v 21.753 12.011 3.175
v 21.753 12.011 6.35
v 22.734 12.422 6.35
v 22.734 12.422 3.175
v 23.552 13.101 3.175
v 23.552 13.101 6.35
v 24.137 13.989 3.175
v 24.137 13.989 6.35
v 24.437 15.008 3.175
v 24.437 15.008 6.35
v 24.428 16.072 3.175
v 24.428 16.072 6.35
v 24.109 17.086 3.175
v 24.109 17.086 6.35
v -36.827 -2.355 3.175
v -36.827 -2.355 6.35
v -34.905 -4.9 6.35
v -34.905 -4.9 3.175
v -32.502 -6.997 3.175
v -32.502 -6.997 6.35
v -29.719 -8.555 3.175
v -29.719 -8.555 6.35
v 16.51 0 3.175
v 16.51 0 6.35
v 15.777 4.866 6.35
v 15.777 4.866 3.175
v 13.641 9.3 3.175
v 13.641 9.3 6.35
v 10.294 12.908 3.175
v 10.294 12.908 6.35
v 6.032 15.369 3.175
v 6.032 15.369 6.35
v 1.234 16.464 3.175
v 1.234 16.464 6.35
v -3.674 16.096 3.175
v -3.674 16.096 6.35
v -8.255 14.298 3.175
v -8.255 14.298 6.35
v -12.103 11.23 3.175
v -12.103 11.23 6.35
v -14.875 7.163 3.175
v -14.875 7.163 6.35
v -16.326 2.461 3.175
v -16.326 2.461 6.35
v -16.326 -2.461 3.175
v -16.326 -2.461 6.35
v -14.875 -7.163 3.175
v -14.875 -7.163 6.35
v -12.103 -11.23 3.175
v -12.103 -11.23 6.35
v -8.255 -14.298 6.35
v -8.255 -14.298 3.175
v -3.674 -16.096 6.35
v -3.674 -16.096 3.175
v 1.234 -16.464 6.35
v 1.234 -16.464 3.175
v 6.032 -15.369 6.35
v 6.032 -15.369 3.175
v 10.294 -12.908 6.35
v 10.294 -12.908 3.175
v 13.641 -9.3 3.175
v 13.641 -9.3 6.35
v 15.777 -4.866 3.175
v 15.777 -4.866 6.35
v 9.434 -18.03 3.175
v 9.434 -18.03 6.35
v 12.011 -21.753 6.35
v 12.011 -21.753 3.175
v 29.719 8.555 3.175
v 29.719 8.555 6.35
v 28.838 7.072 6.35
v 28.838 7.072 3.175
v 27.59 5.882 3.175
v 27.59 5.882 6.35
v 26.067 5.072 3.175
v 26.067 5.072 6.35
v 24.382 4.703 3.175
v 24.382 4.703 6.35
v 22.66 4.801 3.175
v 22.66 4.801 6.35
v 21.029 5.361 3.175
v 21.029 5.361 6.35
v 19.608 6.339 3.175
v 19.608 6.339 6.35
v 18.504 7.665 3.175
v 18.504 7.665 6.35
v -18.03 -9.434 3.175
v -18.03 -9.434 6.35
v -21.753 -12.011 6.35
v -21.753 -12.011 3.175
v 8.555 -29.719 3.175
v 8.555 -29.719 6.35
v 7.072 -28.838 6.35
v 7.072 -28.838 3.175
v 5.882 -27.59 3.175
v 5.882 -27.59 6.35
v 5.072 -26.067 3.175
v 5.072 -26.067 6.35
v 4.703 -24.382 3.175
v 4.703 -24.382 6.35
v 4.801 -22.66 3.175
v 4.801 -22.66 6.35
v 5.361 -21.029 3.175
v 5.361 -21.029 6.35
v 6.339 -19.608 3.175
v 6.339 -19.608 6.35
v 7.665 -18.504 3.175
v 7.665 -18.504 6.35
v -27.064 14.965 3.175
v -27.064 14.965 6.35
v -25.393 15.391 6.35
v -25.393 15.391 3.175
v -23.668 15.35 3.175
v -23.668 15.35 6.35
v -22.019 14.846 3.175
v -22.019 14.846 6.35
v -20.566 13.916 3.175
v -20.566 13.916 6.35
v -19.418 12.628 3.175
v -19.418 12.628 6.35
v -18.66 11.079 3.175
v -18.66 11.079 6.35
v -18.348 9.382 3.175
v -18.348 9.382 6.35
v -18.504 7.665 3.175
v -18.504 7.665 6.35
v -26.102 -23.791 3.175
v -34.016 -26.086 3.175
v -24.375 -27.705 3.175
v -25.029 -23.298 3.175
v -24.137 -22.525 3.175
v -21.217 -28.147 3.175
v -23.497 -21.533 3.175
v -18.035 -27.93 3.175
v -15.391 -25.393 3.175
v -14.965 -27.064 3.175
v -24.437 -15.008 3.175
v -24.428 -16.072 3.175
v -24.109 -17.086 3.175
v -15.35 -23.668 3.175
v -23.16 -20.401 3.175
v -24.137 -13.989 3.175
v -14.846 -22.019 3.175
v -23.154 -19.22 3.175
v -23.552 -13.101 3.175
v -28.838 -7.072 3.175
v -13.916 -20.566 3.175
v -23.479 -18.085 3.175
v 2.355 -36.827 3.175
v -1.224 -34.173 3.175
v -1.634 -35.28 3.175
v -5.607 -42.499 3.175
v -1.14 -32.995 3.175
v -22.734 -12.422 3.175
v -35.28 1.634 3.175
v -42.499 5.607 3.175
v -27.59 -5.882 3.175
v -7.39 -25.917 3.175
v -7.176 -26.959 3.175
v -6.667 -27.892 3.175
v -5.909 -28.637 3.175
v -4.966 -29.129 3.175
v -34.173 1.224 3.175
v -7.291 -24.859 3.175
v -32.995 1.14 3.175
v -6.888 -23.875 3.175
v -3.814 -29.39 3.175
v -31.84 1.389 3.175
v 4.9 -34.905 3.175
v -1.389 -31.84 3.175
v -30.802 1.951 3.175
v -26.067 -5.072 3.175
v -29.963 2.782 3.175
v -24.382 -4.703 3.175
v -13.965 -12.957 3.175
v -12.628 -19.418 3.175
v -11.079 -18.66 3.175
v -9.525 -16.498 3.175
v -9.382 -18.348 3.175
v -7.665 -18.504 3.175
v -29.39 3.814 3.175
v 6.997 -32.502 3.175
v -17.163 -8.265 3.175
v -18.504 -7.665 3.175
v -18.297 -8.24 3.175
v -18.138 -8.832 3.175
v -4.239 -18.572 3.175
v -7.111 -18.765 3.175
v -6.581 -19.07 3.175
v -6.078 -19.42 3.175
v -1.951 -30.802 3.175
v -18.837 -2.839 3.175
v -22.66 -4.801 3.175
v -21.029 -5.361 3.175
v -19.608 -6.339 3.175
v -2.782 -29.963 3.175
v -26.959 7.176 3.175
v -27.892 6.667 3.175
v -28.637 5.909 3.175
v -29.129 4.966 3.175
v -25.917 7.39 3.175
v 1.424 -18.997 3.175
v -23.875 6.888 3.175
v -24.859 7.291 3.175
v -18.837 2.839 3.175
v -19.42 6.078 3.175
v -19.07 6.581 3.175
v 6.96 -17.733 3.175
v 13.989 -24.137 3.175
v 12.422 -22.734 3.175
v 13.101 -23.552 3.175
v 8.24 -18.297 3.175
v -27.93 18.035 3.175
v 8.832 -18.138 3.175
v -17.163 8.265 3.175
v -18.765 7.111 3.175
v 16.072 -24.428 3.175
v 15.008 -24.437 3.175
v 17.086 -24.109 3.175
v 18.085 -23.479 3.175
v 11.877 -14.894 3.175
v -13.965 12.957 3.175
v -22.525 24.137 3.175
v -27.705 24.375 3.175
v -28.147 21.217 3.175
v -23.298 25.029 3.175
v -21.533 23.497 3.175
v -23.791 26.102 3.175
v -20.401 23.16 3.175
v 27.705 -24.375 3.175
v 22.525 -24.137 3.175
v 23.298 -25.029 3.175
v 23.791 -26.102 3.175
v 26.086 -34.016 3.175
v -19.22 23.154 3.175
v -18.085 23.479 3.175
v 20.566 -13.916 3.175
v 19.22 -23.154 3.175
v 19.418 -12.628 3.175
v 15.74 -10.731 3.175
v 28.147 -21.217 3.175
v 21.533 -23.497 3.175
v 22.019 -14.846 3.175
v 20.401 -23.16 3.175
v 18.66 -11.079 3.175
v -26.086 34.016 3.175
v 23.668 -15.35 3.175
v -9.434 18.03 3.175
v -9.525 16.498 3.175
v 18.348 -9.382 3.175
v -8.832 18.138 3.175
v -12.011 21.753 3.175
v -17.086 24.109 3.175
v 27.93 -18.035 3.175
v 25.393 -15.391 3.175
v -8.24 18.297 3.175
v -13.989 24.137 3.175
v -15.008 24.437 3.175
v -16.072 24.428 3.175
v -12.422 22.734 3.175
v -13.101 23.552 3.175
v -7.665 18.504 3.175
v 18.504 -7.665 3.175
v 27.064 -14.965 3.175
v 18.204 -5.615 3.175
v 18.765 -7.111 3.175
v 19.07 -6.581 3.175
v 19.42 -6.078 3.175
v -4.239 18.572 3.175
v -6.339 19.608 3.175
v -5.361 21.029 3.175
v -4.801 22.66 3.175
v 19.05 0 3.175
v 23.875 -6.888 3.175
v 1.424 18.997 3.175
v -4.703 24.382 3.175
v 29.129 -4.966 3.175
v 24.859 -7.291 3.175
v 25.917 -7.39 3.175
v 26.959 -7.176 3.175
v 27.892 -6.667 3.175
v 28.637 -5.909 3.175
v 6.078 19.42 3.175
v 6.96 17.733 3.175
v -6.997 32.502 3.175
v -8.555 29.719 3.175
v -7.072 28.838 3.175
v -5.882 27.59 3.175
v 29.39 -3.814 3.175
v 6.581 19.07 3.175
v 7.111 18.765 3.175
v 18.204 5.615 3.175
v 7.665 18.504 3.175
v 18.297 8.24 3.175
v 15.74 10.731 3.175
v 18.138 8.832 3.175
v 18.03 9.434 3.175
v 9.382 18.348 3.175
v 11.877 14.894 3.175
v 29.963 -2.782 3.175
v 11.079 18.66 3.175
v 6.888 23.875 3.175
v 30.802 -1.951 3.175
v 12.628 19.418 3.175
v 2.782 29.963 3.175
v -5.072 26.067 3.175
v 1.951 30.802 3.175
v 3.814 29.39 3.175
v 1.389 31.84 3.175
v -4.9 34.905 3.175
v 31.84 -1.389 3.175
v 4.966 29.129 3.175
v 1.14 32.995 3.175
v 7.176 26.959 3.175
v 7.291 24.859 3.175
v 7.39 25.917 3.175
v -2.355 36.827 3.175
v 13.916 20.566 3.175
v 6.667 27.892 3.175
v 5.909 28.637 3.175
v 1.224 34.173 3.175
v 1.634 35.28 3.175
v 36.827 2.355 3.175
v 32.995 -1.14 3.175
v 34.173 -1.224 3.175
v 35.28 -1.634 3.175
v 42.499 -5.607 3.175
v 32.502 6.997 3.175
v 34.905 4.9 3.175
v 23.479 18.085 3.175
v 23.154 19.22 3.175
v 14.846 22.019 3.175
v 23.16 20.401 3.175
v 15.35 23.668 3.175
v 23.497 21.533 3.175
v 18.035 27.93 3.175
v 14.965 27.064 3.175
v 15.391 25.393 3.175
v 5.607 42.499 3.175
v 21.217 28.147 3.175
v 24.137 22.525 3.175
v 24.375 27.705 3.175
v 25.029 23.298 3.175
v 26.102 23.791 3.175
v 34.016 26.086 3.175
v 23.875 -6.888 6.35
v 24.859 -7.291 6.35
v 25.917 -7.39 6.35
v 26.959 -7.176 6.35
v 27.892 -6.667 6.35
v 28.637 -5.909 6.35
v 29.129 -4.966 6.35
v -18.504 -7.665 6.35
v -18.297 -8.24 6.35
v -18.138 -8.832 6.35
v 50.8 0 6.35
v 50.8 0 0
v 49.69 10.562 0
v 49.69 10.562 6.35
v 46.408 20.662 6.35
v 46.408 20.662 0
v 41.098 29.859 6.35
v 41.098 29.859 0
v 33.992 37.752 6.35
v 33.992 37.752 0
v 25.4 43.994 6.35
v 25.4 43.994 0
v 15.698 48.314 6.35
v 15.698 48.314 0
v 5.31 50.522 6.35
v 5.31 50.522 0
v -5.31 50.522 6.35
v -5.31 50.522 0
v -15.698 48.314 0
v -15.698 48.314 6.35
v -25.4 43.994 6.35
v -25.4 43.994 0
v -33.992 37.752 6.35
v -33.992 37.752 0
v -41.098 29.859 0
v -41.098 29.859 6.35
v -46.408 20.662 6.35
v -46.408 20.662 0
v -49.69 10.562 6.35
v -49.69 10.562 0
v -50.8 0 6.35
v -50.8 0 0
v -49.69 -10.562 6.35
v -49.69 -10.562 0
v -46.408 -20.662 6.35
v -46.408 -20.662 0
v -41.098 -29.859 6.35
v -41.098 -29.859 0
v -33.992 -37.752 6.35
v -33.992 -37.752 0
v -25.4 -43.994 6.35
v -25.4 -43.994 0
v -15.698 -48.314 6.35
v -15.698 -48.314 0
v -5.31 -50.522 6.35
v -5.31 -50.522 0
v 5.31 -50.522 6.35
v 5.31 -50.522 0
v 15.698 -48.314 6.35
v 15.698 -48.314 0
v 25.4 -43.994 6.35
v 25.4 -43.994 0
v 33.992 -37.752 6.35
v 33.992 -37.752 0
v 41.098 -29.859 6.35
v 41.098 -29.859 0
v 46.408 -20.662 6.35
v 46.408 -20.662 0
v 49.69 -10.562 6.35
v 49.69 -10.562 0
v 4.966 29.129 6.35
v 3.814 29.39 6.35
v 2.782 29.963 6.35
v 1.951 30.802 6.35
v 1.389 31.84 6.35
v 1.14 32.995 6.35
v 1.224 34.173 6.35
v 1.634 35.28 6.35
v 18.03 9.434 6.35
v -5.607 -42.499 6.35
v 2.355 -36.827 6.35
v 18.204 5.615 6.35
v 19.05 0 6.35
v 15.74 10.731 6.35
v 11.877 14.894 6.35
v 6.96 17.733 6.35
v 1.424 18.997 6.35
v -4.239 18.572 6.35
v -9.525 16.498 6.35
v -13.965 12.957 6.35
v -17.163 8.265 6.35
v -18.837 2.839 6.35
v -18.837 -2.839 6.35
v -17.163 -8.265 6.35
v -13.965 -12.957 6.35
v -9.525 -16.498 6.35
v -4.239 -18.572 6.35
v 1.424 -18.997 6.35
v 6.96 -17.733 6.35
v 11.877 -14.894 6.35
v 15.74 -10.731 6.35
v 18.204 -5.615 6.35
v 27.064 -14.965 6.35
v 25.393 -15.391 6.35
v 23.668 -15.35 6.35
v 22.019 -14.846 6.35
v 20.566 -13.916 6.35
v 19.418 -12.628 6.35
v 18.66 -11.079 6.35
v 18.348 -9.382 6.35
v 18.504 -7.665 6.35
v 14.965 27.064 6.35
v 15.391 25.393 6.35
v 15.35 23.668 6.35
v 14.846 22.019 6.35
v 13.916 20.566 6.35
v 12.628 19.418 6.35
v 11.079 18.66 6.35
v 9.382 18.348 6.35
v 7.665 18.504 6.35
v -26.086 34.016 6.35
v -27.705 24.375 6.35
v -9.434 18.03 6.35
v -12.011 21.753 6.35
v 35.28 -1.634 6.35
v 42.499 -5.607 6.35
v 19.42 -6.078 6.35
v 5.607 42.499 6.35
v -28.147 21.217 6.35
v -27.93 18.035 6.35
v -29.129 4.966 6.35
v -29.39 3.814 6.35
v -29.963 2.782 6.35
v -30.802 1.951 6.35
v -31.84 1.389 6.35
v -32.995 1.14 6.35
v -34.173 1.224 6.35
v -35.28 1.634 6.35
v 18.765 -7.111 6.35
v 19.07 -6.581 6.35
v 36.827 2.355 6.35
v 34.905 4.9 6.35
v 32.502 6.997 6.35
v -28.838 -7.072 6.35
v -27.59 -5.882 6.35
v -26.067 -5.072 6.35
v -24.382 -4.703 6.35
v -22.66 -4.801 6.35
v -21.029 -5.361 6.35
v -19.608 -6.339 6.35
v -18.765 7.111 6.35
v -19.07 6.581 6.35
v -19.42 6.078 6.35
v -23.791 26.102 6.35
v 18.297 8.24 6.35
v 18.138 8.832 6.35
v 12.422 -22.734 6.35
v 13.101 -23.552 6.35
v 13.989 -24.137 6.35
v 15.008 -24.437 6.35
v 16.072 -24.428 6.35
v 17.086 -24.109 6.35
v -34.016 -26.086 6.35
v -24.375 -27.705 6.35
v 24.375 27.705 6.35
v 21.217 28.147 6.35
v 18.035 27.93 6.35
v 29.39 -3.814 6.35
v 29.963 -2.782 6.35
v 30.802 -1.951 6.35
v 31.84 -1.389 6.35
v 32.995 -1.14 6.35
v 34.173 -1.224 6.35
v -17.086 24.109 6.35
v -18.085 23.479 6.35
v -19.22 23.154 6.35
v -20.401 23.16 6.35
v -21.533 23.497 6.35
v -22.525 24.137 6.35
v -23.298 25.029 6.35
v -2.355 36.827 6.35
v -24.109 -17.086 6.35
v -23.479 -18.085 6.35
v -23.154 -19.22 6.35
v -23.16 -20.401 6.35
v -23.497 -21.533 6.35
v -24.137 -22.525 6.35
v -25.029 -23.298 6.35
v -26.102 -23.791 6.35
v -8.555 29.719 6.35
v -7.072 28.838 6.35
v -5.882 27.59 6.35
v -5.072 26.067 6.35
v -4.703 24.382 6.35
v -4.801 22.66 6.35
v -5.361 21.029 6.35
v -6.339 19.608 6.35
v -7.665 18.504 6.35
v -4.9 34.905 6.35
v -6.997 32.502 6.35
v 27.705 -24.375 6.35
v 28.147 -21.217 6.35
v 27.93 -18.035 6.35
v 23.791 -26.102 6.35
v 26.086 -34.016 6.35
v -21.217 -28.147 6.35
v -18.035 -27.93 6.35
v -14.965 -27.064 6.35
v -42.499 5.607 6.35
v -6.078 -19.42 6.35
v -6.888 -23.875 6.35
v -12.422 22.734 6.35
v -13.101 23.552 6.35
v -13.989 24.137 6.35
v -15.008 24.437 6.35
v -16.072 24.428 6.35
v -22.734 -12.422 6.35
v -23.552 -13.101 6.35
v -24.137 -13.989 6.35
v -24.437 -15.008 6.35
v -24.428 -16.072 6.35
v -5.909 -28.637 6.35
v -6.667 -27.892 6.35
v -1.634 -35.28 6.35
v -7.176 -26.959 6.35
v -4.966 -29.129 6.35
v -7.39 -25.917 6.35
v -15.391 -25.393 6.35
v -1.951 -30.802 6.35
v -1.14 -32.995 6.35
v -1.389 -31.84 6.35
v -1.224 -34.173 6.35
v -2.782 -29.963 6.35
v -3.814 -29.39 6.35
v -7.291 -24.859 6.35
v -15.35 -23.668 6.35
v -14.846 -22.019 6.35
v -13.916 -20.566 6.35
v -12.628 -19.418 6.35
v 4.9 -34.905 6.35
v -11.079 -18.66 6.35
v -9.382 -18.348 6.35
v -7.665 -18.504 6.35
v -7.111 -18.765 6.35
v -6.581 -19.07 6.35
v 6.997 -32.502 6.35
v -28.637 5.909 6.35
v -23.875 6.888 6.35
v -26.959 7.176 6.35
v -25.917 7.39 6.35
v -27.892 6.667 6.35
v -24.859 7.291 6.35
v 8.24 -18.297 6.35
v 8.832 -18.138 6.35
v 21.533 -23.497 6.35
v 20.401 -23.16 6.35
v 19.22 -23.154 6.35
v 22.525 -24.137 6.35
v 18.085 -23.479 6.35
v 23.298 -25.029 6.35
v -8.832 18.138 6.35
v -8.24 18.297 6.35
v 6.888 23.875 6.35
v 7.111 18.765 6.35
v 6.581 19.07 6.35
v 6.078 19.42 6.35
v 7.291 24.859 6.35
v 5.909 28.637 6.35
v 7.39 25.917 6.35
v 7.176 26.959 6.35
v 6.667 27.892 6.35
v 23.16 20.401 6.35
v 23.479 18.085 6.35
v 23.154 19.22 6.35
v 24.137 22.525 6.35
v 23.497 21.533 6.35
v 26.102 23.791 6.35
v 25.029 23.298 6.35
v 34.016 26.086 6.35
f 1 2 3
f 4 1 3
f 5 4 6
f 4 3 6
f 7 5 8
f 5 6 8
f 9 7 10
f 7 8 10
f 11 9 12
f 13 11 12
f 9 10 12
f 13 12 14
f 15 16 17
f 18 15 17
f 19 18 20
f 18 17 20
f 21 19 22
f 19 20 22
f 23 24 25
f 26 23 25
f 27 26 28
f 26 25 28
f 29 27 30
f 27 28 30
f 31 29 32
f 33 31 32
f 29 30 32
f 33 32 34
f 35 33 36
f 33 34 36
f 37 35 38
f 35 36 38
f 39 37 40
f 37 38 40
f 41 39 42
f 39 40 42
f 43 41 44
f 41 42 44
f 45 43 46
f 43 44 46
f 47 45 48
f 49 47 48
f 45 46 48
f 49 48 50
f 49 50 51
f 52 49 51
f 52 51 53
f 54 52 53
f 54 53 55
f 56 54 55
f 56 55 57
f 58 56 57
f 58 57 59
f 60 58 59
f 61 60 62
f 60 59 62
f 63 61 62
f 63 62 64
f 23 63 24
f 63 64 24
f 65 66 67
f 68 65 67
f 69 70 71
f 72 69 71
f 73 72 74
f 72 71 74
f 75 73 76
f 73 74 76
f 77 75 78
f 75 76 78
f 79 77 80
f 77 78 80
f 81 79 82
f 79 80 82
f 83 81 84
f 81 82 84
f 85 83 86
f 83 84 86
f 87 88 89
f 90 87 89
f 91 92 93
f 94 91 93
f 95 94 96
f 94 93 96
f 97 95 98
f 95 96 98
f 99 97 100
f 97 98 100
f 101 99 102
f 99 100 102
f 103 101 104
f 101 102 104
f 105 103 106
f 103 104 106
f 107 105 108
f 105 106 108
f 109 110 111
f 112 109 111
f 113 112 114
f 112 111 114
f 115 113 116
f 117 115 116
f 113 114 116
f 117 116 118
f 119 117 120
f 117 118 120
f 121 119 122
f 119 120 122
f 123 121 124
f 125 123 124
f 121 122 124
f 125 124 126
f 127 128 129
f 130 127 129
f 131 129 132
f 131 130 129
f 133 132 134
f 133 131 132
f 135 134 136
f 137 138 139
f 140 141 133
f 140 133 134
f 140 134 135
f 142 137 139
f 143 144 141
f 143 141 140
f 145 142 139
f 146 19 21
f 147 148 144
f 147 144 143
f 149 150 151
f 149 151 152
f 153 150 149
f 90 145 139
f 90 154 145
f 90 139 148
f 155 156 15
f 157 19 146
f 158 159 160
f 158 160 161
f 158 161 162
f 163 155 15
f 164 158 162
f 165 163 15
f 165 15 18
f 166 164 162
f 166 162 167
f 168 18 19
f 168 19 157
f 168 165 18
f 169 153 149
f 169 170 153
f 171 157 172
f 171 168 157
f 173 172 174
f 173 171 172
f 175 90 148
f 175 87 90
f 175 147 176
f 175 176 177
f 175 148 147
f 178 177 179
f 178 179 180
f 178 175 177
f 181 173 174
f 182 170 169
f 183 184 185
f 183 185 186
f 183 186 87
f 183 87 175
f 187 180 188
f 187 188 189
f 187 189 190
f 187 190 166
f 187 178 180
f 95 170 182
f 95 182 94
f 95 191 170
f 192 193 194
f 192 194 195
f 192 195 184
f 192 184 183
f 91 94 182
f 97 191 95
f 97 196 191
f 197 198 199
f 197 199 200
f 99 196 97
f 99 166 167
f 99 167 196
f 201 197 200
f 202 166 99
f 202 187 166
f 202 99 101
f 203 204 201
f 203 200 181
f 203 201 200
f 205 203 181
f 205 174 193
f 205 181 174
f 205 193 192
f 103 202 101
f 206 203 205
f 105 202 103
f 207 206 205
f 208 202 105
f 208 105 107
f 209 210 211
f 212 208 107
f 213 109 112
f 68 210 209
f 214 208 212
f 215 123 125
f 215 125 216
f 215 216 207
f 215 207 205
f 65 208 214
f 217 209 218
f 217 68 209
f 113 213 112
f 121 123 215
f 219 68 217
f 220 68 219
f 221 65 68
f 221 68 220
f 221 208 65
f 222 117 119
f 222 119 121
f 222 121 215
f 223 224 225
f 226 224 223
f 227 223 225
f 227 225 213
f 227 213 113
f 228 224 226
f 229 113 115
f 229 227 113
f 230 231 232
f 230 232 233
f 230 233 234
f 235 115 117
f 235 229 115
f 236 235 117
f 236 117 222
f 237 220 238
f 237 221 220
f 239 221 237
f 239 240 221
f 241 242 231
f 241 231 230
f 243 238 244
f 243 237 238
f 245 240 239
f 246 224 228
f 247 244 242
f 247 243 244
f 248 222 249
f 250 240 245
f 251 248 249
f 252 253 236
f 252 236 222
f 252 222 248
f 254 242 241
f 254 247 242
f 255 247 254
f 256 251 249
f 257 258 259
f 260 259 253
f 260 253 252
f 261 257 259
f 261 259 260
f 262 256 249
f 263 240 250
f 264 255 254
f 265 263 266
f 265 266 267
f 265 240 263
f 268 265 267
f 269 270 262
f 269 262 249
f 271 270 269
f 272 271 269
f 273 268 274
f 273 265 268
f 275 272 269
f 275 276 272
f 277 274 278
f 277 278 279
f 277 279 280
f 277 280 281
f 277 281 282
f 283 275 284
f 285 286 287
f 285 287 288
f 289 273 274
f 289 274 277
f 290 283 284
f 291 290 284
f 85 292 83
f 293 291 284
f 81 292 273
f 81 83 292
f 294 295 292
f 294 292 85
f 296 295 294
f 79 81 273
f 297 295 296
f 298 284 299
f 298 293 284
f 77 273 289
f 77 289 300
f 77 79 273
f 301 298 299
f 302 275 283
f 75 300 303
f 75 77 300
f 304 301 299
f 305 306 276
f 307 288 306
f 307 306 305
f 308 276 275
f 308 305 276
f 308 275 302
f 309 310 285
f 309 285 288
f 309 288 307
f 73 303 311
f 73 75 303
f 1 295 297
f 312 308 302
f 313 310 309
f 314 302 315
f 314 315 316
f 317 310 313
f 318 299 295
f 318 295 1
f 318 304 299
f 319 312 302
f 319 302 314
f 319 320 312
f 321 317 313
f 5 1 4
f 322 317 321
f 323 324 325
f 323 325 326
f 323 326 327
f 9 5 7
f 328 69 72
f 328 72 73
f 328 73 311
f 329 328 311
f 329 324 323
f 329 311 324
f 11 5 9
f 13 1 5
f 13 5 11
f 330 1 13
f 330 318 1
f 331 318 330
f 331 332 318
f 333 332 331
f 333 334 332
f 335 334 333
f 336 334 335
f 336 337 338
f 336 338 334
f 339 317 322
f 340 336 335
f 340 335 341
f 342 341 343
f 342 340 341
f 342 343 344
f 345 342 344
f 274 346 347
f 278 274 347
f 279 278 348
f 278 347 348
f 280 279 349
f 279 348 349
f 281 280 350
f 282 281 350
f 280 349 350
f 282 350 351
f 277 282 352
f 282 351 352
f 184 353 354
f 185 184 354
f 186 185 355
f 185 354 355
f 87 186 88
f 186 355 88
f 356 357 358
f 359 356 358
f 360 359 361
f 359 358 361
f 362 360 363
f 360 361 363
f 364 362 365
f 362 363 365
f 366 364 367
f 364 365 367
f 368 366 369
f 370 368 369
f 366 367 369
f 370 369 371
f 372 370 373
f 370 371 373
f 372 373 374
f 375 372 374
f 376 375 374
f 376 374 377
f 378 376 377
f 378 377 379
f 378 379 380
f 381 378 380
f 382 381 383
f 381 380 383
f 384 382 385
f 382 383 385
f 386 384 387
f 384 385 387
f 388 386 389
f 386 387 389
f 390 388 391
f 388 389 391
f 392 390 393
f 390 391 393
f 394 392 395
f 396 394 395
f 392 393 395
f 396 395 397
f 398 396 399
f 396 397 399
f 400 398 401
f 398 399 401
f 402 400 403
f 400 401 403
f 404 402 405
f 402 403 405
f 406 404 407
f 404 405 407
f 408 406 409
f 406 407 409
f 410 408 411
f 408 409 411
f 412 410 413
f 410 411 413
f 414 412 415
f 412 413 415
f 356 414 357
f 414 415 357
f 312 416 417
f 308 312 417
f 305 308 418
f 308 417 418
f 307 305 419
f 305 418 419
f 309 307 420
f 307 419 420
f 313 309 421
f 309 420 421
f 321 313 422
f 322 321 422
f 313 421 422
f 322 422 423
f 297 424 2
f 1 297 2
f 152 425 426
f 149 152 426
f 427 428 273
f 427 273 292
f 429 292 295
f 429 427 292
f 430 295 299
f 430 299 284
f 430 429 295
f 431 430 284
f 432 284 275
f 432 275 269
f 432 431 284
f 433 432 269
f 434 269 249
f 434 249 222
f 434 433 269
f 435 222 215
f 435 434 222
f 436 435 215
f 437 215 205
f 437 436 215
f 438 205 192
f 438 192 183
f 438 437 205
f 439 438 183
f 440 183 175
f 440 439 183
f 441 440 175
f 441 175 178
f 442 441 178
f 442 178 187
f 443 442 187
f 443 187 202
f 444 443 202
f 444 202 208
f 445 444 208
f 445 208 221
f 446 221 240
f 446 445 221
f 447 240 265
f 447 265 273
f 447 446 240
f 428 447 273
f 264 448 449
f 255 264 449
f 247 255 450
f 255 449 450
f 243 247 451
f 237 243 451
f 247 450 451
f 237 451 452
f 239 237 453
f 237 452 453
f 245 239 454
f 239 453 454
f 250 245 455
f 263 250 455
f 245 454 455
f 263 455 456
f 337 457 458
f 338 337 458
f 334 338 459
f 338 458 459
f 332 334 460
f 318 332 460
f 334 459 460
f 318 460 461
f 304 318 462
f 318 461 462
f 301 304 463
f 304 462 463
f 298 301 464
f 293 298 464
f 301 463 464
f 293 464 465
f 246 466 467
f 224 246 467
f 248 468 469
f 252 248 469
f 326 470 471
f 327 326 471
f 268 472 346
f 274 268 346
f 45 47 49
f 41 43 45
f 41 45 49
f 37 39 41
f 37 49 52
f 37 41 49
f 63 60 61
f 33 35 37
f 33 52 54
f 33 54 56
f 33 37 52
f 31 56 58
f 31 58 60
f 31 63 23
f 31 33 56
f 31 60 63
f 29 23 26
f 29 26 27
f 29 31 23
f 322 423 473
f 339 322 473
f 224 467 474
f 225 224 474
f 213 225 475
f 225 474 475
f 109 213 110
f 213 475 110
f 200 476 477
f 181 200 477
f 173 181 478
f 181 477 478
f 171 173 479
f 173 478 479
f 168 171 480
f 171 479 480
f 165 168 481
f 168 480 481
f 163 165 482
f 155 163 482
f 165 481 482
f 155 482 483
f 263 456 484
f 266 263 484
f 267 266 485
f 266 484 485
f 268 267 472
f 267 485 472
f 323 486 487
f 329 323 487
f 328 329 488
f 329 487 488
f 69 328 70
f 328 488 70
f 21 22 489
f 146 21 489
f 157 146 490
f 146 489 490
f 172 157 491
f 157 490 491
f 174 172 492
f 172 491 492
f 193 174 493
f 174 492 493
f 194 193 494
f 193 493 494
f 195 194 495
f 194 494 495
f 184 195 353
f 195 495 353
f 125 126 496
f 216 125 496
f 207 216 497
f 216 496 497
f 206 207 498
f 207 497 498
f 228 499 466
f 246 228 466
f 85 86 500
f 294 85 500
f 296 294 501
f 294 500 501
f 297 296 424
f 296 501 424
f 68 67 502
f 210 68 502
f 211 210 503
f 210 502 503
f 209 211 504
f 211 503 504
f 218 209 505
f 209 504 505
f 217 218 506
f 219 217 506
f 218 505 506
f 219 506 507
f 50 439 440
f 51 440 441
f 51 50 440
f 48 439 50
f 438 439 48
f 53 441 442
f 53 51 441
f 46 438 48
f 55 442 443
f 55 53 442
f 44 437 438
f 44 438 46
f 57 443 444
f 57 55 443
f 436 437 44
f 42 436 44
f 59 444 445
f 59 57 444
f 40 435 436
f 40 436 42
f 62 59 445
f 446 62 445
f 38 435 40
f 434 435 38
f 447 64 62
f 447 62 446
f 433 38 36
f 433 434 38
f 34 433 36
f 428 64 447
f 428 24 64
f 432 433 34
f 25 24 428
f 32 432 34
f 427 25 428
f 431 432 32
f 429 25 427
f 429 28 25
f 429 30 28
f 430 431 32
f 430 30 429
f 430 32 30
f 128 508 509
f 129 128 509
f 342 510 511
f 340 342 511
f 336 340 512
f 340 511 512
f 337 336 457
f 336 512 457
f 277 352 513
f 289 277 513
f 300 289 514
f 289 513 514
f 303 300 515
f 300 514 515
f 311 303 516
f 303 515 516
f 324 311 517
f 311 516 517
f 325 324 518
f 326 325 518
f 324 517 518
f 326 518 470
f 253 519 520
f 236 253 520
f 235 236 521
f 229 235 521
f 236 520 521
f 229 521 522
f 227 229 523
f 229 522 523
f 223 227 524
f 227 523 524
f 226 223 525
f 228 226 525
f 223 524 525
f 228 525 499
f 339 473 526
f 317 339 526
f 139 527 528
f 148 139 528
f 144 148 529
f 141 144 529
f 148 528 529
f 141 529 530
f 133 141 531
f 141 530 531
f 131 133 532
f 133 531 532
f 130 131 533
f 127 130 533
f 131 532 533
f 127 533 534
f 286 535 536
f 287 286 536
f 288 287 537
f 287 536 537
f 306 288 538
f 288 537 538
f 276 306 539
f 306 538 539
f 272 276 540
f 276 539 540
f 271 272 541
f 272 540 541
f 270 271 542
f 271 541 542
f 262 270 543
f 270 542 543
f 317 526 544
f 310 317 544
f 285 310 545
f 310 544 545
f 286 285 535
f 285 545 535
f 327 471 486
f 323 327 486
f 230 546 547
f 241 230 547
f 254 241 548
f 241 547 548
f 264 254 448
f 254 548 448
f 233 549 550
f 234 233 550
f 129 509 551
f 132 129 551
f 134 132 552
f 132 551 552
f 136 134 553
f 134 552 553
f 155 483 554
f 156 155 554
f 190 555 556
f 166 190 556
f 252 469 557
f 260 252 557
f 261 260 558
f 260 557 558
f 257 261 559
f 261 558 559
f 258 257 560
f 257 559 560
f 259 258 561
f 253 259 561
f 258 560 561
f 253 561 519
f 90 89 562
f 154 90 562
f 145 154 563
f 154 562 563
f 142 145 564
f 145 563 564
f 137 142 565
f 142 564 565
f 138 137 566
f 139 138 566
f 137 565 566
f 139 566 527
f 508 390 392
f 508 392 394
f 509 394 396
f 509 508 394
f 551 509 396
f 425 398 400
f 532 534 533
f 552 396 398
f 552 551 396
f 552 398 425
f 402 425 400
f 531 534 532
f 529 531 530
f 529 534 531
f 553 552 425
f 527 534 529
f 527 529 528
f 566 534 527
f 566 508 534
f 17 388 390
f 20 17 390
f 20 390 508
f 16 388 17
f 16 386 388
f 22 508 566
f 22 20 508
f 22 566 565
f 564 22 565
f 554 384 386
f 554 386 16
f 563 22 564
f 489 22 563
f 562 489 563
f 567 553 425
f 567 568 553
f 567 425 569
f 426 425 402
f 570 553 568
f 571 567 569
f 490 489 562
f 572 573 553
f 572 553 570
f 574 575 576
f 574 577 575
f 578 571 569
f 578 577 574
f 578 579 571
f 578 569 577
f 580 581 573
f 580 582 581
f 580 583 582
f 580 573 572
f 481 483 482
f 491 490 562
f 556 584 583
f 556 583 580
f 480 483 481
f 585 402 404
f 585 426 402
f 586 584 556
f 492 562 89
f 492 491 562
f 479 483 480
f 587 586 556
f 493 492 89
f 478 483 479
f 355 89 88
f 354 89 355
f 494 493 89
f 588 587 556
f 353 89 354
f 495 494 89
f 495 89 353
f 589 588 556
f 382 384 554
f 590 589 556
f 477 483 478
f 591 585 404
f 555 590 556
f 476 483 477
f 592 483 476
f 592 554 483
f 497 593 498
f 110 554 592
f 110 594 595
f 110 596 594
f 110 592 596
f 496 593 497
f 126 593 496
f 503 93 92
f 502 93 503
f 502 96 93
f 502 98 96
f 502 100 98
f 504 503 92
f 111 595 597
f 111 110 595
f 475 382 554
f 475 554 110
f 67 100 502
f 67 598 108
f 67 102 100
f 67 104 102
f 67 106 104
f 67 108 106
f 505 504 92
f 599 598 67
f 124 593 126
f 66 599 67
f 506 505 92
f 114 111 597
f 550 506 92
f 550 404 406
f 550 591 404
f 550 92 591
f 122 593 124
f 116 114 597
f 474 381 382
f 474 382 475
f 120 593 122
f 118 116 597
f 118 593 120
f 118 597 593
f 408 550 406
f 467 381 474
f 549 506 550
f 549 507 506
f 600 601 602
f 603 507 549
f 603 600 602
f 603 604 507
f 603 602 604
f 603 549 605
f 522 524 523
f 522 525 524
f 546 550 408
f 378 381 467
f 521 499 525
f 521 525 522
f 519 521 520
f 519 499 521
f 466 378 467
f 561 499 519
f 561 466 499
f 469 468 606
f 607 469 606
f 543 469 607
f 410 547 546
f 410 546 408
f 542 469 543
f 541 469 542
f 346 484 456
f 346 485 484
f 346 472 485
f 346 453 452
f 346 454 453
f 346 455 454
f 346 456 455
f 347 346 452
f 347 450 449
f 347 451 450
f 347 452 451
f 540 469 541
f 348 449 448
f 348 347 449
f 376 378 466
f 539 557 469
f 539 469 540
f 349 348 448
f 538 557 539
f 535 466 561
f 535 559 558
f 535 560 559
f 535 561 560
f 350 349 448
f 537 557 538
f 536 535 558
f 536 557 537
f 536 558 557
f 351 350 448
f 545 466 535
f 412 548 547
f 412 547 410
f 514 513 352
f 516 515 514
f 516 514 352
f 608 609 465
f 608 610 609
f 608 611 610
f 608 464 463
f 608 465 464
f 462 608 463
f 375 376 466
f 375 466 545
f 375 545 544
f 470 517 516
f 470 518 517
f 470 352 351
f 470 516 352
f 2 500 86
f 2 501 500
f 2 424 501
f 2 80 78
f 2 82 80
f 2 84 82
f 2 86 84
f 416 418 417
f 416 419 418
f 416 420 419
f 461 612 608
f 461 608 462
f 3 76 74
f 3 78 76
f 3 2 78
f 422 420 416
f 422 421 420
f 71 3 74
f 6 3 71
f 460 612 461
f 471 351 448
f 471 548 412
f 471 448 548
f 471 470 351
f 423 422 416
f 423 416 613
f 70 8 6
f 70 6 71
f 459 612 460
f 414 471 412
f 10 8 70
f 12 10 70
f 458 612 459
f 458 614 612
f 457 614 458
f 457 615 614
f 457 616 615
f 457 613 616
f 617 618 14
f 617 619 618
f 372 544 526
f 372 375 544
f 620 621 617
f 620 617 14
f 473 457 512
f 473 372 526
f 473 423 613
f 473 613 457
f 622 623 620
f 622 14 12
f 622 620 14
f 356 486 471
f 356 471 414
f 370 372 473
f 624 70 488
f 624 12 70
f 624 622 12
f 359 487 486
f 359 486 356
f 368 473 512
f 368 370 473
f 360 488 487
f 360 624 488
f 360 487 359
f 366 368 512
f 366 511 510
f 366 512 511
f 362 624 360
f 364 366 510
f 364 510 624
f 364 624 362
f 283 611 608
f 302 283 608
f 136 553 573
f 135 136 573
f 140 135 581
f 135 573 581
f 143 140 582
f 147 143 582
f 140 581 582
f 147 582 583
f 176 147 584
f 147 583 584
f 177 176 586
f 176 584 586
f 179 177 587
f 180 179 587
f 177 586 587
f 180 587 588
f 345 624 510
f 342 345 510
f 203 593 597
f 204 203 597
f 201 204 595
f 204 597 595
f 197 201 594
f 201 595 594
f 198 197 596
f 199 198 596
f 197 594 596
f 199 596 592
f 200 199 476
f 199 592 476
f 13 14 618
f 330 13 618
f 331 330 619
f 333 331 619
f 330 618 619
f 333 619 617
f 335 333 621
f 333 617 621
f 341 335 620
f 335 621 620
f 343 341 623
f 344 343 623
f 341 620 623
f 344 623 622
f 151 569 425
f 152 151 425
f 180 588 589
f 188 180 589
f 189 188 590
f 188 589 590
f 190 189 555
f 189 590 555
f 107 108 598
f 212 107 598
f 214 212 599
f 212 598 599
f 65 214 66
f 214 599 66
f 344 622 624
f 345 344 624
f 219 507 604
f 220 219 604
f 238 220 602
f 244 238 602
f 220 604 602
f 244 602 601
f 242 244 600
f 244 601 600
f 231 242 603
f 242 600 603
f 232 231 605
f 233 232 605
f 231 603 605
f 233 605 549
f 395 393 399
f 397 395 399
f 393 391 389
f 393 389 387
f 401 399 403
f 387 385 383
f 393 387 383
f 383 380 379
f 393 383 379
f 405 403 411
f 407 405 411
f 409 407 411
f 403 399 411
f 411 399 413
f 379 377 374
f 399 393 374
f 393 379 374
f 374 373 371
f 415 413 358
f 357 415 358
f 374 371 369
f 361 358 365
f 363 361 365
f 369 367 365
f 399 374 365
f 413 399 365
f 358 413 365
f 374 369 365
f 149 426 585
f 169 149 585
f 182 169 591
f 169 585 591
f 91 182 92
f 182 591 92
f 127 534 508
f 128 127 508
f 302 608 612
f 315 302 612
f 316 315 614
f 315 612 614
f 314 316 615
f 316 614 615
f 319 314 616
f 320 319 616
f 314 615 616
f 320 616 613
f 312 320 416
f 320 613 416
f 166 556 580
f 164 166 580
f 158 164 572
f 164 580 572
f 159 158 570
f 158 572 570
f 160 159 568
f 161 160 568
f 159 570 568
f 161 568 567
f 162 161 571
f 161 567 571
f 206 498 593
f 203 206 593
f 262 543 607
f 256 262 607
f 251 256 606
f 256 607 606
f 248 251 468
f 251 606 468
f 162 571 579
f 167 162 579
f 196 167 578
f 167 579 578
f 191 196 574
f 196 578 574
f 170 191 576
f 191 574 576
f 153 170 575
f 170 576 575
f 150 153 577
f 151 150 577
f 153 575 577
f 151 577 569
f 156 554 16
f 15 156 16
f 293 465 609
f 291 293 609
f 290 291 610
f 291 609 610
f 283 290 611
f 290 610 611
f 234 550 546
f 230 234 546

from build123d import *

# Parameters (mm, degrees)
F0_R     = 50.8
F1_DEPTH = 6.35
F2_R     = 19.05
F2_R_2   = 16.51
F3_DEPTH = 3.175


with BuildPart() as f1:
    # F0 (on Top) → F1 (new body)
    with BuildSketch(Plane.XY):
        Circle(F0_R)
    extrude(amount=F1_DEPTH)

    # F2 (on face) → F3 (cut)
    with BuildSketch(Plane.XY.offset(6.35)):
        with BuildLine():
            ThreePointArc((-27.064107, 14.965056), (-20.566075, 13.915697), (-18.50429, 7.664728))
            ThreePointArc((-18.50429, 7.664728), (-18.911897, 6.842578), (-19.419766, 6.078285))
            Line((-19.419766, 6.078285), (-23.875048, 6.888337))
            ThreePointArc((-23.875048, 6.888337), (-26.958737, 7.175685), (-29.128942, 4.96618))
            ThreePointArc((-29.128942, 4.96618), (-31.301297, 1.633058), (-35.279843, 1.634443))
            Line((-35.279843, 1.634443), (-42.498607, 5.606899))
            Line((-42.498607, 5.606899), (-36.826611, -2.354635))
            ThreePointArc((-36.826611, -2.354635), (-33.757711, -6.010738), (-29.719107, -8.555321))
            ThreePointArc((-29.719107, -8.555321), (-24.382295, -4.702528), (-18.50429, -7.664728))
            ThreePointArc((-18.50429, -7.664728), (-18.211164, -8.534298), (-18.029845, -9.433852))
            Line((-18.029845, -9.433852), (-21.752998, -12.011419))
            ThreePointArc((-21.752998, -12.011419), (-24.136681, -13.98873), (-24.108892, -17.085653))
            ThreePointArc((-24.108892, -17.085653), (-23.288106, -20.978613), (-26.102342, -23.79089))
            Line((-26.102342, -23.79089), (-34.01573, -26.086377))
            Line((-34.01573, -26.086377), (-24.375368, -27.705325))
            ThreePointArc((-24.375368, -27.705325), (-19.620073, -28.12054), (-14.965056, -27.064107))
            ThreePointArc((-14.965056, -27.064107), (-13.915697, -20.566075), (-7.664728, -18.50429))
            ThreePointArc((-7.664728, -18.50429), (-6.842578, -18.911897), (-6.078285, -19.419766))
            Line((-6.078285, -19.419766), (-6.888337, -23.875048))
            ThreePointArc((-6.888337, -23.875048), (-7.175685, -26.958737), (-4.96618, -29.128942))
            ThreePointArc((-4.96618, -29.128942), (-1.633058, -31.301297), (-1.634443, -35.279843))
            Line((-1.634443, -35.279843), (-5.606899, -42.498607))
            Line((-5.606899, -42.498607), (2.354635, -36.826611))
            ThreePointArc((2.354635, -36.826611), (6.010738, -33.757711), (8.555321, -29.719107))
            ThreePointArc((8.555321, -29.719107), (4.702528, -24.382295), (7.664728, -18.50429))
            ThreePointArc((7.664728, -18.50429), (8.534298, -18.211164), (9.433852, -18.029845))
            Line((9.433852, -18.029845), (12.011419, -21.752998))
            ThreePointArc((12.011419, -21.752998), (13.98873, -24.136681), (17.085653, -24.108892))
            ThreePointArc((17.085653, -24.108892), (20.978613, -23.288106), (23.79089, -26.102342))
            Line((23.79089, -26.102342), (26.086377, -34.01573))
            Line((26.086377, -34.01573), (27.705325, -24.375368))
            ThreePointArc((27.705325, -24.375368), (28.12054, -19.620073), (27.064107, -14.965056))
            ThreePointArc((27.064107, -14.965056), (20.566075, -13.915697), (18.50429, -7.664728))
            ThreePointArc((18.50429, -7.664728), (18.911897, -6.842578), (19.419766, -6.078285))
            Line((19.419766, -6.078285), (23.875048, -6.888337))
            ThreePointArc((23.875048, -6.888337), (26.958737, -7.175685), (29.128942, -4.96618))
            ThreePointArc((29.128942, -4.96618), (31.301297, -1.633058), (35.279843, -1.634443))
            Line((35.279843, -1.634443), (42.498607, -5.606899))
            Line((42.498607, -5.606899), (36.826611, 2.354635))
            ThreePointArc((36.826611, 2.354635), (33.757711, 6.010738), (29.719107, 8.555321))
            ThreePointArc((29.719107, 8.555321), (24.382295, 4.702528), (18.50429, 7.664728))
            ThreePointArc((18.50429, 7.664728), (18.211164, 8.534298), (18.029845, 9.433852))
            Line((18.029845, 9.433852), (21.752998, 12.011419))
            ThreePointArc((21.752998, 12.011419), (24.136681, 13.98873), (24.108892, 17.085653))
            ThreePointArc((24.108892, 17.085653), (23.288106, 20.978613), (26.102342, 23.79089))
            Line((26.102342, 23.79089), (34.01573, 26.086377))
            Line((34.01573, 26.086377), (24.375368, 27.705325))
            ThreePointArc((24.375368, 27.705325), (19.620073, 28.12054), (14.965056, 27.064107))
            ThreePointArc((14.965056, 27.064107), (13.915697, 20.566075), (7.664728, 18.50429))
            ThreePointArc((7.664728, 18.50429), (6.842578, 18.911897), (6.078285, 19.419766))
            Line((6.078285, 19.419766), (6.888337, 23.875048))
            ThreePointArc((6.888337, 23.875048), (7.175685, 26.958737), (4.96618, 29.128942))
            ThreePointArc((4.96618, 29.128942), (1.633058, 31.301297), (1.634443, 35.279843))
            Line((1.634443, 35.279843), (5.606899, 42.498607))
            Line((5.606899, 42.498607), (-2.354635, 36.826611))
            ThreePointArc((-2.354635, 36.826611), (-6.010738, 33.757711), (-8.555321, 29.719107))
            ThreePointArc((-8.555321, 29.719107), (-4.702528, 24.382295), (-7.664728, 18.50429))
            ThreePointArc((-7.664728, 18.50429), (-8.534298, 18.211164), (-9.433852, 18.029845))
            Line((-9.433852, 18.029845), (-12.011419, 21.752998))
            ThreePointArc((-12.011419, 21.752998), (-13.98873, 24.136681), (-17.085653, 24.108892))
            ThreePointArc((-17.085653, 24.108892), (-20.978613, 23.288106), (-23.79089, 26.102342))
            Line((-23.79089, 26.102342), (-26.086377, 34.01573))
            Line((-26.086377, 34.01573), (-27.705325, 24.375368))
            ThreePointArc((-27.705325, 24.375368), (-28.12054, 19.620073), (-27.064107, 14.965056))
        make_face()
        Circle(F2_R, mode=Mode.SUBTRACT)
        Circle(F2_R_2)
    extrude(amount=-F3_DEPTH, mode=Mode.SUBTRACT)


solid = f1.part
